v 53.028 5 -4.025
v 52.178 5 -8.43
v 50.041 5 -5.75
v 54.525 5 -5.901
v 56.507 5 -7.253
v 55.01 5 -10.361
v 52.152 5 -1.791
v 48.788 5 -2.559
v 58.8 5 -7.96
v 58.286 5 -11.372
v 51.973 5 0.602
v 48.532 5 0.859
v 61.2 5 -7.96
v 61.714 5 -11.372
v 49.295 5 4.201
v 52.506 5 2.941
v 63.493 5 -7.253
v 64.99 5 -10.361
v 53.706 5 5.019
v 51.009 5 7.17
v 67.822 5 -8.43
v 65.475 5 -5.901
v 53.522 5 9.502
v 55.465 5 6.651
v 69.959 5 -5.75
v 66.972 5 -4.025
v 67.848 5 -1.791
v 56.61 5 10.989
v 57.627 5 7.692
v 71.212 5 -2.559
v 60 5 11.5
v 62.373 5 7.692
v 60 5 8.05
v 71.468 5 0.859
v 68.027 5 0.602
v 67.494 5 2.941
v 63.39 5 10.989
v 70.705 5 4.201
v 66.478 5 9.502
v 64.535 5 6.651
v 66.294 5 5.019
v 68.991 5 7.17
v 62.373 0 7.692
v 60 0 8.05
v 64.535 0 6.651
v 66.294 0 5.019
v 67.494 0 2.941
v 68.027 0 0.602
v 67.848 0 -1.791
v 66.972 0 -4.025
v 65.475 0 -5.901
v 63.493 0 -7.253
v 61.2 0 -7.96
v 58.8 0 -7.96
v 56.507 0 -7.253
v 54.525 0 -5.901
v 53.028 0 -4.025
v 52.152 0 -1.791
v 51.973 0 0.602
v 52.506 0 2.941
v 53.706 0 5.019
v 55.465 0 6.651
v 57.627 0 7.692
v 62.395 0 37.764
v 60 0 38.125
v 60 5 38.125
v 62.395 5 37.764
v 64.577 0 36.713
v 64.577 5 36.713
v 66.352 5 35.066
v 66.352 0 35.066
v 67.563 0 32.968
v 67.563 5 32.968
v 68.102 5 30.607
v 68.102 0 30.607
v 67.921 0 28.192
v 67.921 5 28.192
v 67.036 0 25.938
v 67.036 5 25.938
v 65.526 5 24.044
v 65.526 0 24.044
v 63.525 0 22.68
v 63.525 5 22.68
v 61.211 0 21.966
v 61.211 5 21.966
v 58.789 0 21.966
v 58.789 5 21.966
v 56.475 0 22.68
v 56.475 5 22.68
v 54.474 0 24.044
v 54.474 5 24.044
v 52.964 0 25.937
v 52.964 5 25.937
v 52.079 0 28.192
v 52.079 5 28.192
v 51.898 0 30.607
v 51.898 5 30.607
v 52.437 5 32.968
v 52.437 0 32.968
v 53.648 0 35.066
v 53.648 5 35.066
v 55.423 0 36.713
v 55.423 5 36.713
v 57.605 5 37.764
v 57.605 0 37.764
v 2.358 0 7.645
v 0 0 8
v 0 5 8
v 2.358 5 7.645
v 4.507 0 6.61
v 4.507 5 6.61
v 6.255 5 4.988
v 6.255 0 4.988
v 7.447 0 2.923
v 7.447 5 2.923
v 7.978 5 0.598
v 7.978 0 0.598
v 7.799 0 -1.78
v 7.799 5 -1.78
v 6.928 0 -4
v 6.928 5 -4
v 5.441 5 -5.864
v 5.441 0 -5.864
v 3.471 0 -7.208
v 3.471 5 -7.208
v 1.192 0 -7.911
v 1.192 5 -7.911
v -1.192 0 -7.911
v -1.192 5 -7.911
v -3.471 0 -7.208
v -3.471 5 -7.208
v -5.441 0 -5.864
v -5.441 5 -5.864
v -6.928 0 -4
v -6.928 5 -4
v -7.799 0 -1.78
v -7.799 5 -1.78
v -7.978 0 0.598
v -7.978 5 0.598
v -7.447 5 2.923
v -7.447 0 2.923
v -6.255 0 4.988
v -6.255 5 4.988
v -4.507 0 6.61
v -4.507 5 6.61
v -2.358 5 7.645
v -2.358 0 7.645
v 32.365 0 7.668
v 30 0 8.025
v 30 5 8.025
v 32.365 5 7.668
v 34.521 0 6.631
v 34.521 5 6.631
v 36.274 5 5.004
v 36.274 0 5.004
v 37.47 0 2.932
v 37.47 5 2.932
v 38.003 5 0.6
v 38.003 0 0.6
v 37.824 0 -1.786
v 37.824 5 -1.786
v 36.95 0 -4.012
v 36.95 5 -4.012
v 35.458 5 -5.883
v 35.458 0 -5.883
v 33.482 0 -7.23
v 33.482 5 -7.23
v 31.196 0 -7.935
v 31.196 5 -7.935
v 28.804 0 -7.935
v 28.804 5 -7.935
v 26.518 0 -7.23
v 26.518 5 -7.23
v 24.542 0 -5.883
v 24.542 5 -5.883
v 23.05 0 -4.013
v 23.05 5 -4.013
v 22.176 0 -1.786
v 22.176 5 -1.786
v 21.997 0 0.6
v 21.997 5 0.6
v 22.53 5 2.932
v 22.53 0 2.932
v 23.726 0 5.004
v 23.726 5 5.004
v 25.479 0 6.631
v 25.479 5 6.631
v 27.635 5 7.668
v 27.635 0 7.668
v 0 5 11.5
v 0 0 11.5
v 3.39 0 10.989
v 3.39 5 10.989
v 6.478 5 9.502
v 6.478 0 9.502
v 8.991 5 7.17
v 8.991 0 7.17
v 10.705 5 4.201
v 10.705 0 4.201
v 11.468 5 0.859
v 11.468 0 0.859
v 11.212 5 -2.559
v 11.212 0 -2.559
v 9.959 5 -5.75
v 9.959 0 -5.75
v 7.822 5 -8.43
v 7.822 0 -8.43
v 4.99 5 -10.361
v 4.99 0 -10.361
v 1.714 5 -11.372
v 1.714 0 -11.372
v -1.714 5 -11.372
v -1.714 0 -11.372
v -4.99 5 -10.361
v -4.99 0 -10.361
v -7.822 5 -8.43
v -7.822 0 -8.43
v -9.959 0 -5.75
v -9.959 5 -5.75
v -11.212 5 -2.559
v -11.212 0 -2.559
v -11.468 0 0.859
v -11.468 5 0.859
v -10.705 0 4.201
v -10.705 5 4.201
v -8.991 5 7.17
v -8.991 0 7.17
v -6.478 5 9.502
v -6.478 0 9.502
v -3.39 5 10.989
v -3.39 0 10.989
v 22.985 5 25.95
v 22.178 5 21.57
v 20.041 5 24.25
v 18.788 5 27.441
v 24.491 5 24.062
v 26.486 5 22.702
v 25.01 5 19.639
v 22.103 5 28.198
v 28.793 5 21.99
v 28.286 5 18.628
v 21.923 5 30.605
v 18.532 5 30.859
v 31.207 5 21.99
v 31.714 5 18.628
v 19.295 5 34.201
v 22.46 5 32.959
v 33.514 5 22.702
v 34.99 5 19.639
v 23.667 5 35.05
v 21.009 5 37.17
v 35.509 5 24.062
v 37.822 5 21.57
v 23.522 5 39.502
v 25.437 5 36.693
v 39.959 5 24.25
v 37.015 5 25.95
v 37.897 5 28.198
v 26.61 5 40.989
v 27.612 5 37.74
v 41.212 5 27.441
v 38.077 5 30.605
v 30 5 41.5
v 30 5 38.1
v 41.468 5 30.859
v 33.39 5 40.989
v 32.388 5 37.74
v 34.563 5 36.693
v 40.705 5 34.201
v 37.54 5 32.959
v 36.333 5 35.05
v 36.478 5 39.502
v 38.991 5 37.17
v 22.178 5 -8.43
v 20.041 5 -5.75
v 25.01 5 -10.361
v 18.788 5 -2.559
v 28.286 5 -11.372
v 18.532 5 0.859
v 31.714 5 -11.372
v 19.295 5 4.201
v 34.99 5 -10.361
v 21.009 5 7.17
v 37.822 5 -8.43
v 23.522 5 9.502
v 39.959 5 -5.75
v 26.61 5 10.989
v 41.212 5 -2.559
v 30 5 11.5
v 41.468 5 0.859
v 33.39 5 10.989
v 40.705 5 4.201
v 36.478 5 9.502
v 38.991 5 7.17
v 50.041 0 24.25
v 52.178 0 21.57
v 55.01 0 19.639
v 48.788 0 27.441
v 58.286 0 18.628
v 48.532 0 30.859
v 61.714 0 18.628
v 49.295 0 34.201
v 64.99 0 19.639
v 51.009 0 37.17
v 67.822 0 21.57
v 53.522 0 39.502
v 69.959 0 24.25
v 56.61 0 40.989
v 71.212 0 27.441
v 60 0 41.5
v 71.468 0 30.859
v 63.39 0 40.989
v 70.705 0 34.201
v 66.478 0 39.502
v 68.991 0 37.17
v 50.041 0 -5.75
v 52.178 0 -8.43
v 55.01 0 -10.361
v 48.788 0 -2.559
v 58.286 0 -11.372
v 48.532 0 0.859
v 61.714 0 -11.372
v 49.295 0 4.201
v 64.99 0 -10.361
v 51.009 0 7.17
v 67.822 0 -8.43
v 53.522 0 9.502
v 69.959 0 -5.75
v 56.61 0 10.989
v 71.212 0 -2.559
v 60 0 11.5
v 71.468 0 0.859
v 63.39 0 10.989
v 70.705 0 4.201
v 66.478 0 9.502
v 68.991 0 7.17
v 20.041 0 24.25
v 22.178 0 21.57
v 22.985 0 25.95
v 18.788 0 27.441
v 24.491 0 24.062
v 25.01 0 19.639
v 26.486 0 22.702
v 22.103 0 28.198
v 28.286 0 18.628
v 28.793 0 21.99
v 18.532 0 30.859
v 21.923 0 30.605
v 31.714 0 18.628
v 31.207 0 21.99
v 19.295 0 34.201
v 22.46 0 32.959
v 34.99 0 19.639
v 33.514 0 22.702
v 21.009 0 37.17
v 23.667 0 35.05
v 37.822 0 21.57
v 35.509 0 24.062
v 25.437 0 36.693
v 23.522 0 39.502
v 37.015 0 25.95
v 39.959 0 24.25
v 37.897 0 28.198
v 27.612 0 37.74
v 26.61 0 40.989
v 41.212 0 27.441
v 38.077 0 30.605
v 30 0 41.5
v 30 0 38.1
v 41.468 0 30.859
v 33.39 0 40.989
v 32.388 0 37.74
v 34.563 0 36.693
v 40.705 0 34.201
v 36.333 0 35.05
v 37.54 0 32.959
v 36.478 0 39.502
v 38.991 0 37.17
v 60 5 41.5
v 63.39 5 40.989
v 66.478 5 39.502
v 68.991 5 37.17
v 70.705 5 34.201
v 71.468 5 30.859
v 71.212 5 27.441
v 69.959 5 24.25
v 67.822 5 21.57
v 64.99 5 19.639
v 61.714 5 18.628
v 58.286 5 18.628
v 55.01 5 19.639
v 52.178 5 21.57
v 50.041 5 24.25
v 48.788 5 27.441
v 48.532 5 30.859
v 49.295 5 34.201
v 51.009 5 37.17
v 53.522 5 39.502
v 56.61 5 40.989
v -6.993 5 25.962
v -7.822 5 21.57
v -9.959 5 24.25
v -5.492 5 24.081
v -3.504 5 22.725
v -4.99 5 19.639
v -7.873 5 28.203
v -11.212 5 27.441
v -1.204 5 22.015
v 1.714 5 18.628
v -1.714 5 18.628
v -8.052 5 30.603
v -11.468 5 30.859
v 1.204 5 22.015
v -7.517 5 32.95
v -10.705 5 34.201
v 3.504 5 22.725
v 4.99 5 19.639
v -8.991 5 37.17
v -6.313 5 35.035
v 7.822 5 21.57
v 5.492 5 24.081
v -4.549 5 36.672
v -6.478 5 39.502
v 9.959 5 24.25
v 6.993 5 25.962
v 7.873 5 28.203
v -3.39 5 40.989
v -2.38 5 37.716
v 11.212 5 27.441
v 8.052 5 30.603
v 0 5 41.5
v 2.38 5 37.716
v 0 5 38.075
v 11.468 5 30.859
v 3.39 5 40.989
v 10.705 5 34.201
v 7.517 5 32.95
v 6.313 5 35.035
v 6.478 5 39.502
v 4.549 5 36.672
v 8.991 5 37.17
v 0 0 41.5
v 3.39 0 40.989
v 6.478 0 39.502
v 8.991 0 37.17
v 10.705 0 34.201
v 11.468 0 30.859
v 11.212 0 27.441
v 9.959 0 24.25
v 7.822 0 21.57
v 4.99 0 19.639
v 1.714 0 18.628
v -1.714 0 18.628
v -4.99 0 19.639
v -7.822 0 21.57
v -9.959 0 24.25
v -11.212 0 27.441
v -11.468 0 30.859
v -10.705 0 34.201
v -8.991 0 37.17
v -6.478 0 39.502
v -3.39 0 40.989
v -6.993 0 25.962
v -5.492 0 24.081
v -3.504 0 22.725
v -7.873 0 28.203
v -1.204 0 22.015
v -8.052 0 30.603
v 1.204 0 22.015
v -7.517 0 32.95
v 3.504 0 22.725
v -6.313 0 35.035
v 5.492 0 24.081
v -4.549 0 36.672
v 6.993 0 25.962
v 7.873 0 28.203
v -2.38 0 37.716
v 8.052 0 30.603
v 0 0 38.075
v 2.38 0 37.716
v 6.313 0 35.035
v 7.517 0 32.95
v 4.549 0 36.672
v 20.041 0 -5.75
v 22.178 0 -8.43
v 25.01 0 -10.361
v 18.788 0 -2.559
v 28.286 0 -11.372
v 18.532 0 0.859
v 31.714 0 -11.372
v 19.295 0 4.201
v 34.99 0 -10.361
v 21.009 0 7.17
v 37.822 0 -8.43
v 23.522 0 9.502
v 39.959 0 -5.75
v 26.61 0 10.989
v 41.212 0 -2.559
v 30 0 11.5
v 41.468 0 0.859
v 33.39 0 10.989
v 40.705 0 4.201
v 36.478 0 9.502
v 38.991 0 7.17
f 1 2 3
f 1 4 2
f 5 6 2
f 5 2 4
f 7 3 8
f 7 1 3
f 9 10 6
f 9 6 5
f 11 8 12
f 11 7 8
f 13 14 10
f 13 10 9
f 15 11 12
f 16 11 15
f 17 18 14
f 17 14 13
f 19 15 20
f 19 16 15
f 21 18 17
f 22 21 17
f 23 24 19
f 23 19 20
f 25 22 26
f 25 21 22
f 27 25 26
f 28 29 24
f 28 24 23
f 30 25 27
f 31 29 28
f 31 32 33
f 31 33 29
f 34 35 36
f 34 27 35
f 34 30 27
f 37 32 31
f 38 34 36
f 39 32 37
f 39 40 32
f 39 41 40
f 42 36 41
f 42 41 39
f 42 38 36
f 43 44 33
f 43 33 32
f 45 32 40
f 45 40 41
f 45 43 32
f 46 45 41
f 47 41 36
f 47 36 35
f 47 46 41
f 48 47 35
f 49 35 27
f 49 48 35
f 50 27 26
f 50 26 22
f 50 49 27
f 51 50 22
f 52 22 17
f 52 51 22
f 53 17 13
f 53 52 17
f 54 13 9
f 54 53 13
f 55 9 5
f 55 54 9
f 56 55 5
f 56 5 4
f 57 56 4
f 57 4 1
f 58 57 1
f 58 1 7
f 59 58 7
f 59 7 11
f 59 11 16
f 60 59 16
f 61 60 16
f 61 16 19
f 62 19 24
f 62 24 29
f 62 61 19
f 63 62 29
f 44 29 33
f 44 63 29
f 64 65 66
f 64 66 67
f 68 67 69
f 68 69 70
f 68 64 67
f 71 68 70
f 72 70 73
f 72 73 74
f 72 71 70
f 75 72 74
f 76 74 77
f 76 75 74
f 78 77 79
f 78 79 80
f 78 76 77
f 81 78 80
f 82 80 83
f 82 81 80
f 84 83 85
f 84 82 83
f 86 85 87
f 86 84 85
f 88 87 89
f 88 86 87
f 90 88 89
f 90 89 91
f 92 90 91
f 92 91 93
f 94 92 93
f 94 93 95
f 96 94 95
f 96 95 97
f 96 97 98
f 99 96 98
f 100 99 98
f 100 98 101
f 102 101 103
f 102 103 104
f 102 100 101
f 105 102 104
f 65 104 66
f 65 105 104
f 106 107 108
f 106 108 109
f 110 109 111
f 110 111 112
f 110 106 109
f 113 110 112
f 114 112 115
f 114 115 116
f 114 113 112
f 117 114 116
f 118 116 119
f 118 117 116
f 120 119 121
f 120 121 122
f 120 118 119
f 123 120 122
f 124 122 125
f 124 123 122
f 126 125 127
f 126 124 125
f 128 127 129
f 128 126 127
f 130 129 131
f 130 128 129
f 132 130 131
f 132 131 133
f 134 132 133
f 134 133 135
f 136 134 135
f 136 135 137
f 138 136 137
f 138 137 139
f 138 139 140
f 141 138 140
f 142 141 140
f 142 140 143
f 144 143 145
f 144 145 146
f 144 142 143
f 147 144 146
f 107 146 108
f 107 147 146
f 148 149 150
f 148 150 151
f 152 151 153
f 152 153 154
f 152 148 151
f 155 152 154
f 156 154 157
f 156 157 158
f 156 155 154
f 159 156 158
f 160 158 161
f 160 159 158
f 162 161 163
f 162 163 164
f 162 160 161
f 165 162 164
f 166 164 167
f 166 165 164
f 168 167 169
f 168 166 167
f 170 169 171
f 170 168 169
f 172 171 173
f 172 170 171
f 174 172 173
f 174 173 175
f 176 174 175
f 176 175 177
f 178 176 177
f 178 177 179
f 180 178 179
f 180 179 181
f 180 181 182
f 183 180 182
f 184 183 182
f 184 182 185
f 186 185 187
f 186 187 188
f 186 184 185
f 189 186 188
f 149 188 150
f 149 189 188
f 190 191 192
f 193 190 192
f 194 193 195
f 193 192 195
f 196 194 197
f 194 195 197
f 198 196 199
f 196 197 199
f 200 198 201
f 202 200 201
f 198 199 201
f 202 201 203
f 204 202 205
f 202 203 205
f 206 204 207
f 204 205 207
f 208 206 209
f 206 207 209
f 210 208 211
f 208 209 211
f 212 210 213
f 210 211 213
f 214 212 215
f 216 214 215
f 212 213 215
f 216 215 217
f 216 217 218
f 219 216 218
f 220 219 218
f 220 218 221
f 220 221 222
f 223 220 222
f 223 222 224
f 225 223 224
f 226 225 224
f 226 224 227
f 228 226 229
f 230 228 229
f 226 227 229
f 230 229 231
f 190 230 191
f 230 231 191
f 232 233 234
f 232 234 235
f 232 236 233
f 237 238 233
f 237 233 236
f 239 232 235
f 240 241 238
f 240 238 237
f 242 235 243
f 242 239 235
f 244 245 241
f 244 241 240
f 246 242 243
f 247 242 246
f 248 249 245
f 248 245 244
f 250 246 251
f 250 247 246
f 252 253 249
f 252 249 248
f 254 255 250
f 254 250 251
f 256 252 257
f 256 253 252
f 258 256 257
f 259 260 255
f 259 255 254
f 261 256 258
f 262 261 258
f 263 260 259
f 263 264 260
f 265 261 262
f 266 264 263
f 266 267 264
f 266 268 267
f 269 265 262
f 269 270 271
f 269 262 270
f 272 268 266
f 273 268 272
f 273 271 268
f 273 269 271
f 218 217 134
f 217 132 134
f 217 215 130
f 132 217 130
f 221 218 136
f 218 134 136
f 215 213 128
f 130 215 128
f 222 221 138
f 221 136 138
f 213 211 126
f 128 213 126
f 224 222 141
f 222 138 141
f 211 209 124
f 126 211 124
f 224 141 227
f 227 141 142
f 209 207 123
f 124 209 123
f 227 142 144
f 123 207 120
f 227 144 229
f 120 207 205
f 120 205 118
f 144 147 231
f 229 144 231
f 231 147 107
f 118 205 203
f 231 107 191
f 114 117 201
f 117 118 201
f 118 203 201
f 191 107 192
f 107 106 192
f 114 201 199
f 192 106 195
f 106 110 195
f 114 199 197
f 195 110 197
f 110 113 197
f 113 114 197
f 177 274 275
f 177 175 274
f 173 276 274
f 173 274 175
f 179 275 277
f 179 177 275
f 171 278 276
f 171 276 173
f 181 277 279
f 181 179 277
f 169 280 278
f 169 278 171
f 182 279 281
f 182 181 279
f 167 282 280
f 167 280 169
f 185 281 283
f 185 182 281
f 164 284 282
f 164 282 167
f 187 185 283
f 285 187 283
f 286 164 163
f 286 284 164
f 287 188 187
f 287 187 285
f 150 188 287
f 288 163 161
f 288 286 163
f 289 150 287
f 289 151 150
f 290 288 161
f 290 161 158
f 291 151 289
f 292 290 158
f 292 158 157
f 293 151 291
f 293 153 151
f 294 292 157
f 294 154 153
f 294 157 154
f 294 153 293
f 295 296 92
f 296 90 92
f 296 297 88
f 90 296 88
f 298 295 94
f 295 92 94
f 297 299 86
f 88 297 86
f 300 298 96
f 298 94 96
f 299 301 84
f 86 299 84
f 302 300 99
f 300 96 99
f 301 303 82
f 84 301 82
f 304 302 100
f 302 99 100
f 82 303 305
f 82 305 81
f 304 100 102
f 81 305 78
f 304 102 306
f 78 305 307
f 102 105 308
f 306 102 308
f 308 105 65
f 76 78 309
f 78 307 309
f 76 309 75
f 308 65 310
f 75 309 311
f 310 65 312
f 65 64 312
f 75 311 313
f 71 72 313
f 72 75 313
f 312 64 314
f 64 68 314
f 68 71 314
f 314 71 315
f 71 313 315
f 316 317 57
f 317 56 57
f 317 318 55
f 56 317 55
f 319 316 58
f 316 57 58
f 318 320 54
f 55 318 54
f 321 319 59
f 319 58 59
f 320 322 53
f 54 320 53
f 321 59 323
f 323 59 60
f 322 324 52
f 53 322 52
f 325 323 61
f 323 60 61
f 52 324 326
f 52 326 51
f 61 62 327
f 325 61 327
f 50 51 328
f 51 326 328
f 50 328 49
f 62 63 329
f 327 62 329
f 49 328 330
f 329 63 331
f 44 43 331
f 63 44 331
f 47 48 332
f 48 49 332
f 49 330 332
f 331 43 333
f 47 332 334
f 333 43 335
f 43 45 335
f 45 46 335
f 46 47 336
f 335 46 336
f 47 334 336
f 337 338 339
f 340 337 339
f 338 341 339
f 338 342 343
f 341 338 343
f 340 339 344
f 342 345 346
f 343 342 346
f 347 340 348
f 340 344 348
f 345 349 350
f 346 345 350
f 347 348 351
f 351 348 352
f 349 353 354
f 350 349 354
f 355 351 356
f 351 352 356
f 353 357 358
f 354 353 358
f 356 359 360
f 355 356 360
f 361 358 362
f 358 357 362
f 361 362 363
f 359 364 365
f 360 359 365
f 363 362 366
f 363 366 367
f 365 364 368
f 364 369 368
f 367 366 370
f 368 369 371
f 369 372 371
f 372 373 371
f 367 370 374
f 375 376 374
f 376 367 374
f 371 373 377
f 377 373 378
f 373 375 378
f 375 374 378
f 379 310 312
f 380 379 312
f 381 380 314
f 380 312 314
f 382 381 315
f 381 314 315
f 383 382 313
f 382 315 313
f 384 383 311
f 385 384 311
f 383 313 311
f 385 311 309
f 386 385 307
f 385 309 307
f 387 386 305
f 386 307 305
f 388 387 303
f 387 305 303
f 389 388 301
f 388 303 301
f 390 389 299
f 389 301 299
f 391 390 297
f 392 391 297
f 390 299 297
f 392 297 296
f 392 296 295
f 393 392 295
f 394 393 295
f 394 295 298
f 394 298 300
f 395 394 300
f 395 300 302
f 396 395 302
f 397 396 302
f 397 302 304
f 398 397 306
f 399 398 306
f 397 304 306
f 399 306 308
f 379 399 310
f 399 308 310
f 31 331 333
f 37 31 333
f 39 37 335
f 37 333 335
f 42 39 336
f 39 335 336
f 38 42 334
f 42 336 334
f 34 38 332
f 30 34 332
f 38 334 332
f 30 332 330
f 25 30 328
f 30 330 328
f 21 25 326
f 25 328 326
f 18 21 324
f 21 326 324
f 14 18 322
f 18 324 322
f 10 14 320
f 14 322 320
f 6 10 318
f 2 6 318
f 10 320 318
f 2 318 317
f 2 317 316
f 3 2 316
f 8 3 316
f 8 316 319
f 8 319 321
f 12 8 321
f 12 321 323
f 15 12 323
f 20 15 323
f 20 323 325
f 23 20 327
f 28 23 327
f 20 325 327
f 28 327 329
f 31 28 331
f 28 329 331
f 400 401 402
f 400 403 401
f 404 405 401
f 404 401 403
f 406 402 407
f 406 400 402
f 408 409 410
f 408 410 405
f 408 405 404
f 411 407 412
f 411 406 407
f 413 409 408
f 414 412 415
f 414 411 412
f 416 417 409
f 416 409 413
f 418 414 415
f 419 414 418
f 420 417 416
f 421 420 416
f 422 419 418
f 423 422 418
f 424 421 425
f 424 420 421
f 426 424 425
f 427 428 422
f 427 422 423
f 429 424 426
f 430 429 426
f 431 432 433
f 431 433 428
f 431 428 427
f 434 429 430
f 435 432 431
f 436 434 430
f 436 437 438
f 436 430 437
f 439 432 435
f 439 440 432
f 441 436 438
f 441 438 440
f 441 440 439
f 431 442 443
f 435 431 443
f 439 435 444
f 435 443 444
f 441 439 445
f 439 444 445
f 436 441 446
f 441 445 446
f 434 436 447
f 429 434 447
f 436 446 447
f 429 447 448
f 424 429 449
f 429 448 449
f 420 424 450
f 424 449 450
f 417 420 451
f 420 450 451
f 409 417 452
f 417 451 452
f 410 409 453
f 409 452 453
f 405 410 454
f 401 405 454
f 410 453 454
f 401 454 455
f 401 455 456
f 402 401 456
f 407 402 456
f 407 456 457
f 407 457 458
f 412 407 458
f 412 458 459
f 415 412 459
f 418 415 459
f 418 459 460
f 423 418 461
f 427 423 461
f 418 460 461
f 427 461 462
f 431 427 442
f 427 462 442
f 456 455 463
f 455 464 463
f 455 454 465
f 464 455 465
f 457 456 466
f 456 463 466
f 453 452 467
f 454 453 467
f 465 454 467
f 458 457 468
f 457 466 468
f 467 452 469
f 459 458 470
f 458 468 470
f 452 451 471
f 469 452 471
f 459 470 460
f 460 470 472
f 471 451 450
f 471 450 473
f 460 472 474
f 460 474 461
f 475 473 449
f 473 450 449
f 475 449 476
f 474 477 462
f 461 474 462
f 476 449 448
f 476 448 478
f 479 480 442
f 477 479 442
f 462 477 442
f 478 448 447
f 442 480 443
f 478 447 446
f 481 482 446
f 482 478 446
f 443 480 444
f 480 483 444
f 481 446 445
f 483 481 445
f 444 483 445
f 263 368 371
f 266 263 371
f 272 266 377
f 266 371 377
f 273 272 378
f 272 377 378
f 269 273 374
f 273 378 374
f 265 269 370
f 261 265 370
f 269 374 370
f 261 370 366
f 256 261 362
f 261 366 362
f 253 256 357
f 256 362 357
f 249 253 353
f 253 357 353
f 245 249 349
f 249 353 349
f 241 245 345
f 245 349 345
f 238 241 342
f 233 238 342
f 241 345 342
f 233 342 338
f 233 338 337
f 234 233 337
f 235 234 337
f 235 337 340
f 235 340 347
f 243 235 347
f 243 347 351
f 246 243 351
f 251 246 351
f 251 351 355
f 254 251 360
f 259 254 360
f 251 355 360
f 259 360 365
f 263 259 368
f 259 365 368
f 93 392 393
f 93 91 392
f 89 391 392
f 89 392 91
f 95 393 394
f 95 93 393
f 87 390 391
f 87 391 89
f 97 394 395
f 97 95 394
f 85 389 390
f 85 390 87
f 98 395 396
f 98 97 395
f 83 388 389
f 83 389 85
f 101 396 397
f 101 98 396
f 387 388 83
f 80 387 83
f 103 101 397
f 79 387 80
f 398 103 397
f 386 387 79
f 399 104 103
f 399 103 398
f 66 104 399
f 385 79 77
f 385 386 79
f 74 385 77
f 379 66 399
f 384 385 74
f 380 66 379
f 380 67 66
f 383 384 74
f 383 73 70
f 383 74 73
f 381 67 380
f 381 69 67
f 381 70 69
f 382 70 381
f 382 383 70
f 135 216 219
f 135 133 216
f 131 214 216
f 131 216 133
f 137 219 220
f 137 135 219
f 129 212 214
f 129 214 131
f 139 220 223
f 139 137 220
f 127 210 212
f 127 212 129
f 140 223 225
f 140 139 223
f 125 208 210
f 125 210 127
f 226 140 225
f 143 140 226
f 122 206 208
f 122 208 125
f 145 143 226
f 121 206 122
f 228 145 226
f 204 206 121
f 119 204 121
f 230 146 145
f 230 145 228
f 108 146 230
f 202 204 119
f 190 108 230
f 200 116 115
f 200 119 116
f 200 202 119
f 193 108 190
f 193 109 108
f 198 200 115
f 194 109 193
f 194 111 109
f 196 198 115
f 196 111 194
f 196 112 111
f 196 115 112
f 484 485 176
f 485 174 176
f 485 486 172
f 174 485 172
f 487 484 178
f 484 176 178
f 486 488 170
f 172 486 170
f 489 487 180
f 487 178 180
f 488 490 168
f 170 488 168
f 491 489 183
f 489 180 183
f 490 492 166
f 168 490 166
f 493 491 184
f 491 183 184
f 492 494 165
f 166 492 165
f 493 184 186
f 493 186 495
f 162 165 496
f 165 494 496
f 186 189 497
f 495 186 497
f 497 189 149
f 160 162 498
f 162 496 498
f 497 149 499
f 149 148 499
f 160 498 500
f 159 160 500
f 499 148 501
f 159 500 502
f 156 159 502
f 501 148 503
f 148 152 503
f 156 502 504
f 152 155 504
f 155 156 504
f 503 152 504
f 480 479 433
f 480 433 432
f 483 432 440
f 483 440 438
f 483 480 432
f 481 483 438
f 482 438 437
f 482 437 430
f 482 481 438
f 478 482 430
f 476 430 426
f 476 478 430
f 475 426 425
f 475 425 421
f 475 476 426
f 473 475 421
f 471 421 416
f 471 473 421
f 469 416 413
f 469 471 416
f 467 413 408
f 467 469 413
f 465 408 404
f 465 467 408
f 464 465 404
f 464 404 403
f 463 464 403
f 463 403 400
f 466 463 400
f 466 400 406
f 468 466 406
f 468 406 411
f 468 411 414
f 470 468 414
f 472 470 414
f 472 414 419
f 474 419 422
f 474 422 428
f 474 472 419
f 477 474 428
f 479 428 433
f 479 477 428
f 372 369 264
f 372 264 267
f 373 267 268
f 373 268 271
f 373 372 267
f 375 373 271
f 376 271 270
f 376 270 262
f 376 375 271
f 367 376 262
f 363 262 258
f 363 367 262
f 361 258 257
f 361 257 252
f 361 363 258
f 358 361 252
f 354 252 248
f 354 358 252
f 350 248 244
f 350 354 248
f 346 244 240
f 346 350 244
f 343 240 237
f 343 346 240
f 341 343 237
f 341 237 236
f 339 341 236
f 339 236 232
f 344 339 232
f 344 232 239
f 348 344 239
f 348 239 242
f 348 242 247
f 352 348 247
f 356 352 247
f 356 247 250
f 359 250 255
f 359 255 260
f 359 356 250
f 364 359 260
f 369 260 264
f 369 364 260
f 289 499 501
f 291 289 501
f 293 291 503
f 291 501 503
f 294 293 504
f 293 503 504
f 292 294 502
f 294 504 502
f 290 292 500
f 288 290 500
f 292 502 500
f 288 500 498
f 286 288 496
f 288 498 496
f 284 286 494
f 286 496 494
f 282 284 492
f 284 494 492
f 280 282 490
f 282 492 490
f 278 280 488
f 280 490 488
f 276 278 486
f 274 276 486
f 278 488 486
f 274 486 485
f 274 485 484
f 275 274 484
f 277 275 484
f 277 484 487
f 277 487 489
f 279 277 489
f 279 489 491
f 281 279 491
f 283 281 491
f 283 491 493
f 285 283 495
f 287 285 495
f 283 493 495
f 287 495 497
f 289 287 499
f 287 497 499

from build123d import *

# Parameters (mm, degrees)
SKETCH1_R             = 11.5
SKETCH1_R_2           = 8
BOSS_EXTRUDE1_DEPTH   = 5
SKETCH1_R_3           = 8.025
BOSS_EXTRUDE1_2_DEPTH = 5
SKETCH1_R_4           = 8.05
BOSS_EXTRUDE1_3_DEPTH = 5
SKETCH1_R_5           = 8.1
BOSS_EXTRUDE1_4_DEPTH = 5
SKETCH1_R_6           = 8.125
BOSS_EXTRUDE1_5_DEPTH = 5
SKETCH1_R_7           = 8.075
BOSS_EXTRUDE1_6_DEPTH = 5


with BuildPart() as part:
    # Sketch1 → Boss-Extrude1 (new body)
    with BuildSketch(Plane(origin=(0, 0, 0), x_dir=(1, 0, 0), z_dir=(0, 1, 0))):
        with Locations(Location((0, 0, 0), (0, 0, 270))):
            Circle(SKETCH1_R)
        with Locations(Location((0, 0, 0), (0, 0, 270))):
            Circle(SKETCH1_R_2, mode=Mode.SUBTRACT)
    extrude(amount=BOSS_EXTRUDE1_DEPTH)


with BuildPart() as body_2:
    # Sketch1 → Boss-Extrude1 2 (new body)
    with BuildSketch(Plane(origin=(0, 0, 0), x_dir=(1, 0, 0), z_dir=(0, 1, 0))):
        with Locations(Location((30, 0, 0), (0, 0, 270))):
            Circle(SKETCH1_R)
        with Locations(Location((30, 0, 0), (0, 0, 270))):
            Circle(SKETCH1_R_3, mode=Mode.SUBTRACT)
    extrude(amount=BOSS_EXTRUDE1_2_DEPTH)


with BuildPart() as body_3:
    # Sketch1 → Boss-Extrude1 3 (new body)
    with BuildSketch(Plane(origin=(0, 0, 0), x_dir=(1, 0, 0), z_dir=(0, 1, 0))):
        with Locations(Location((60, 0, 0), (0, 0, 270))):
            Circle(SKETCH1_R)
        with Locations(Location((60, 0, 0), (0, 0, 270))):
            Circle(SKETCH1_R_4, mode=Mode.SUBTRACT)
    extrude(amount=BOSS_EXTRUDE1_3_DEPTH)


with BuildPart() as body_4:
    # Sketch1 → Boss-Extrude1 4 (new body)
    with BuildSketch(Plane(origin=(0, 0, 0), x_dir=(1, 0, 0), z_dir=(0, 1, 0))):
        with Locations(Location((30, -30, 0), (0, 0, 270))):
            Circle(SKETCH1_R)
        with Locations(Location((30, -30, 0), (0, 0, 270))):
            Circle(SKETCH1_R_5, mode=Mode.SUBTRACT)
    extrude(amount=BOSS_EXTRUDE1_4_DEPTH)


with BuildPart() as body_5:
    # Sketch1 → Boss-Extrude1 5 (new body)
    with BuildSketch(Plane(origin=(0, 0, 0), x_dir=(1, 0, 0), z_dir=(0, 1, 0))):
        with Locations(Location((60, -30, 0), (0, 0, 270))):
            Circle(SKETCH1_R)
        with Locations(Location((60, -30, 0), (0, 0, 270))):
            Circle(SKETCH1_R_6, mode=Mode.SUBTRACT)
    extrude(amount=BOSS_EXTRUDE1_5_DEPTH)


with BuildPart() as body_6:
    # Sketch1 → Boss-Extrude1 6 (new body)
    with BuildSketch(Plane(origin=(0, 0, 0), x_dir=(1, 0, 0), z_dir=(0, 1, 0))):
        with Locations(Location((0, -30, 0), (0, 0, 270))):
            Circle(SKETCH1_R)
        with Locations(Location((0, -30, 0), (0, 0, 270))):
            Circle(SKETCH1_R_7, mode=Mode.SUBTRACT)
    extrude(amount=BOSS_EXTRUDE1_6_DEPTH)


solid = Compound([part.part, body_2.part, body_3.part, body_4.part, body_5.part, body_6.part])
